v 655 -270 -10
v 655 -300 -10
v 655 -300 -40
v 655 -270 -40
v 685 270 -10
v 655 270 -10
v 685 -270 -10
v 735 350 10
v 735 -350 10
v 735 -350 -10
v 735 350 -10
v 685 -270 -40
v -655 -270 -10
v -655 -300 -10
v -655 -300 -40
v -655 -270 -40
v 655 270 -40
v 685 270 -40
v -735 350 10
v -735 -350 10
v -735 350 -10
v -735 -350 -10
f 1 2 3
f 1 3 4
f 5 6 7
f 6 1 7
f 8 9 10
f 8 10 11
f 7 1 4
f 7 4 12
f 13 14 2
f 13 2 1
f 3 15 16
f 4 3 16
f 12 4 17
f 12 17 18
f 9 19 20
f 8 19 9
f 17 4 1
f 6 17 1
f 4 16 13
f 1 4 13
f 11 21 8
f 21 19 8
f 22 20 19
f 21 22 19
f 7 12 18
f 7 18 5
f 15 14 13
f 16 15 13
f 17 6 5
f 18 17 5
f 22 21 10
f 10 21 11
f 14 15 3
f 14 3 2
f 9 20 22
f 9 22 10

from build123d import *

# Parameters (mm, degrees)
F0_W     = 1470
F0_H     = 700
F1_DEPTH = 10
F2_W     = 30
F2_H     = 30
F3_DEPTH = 270
F4_W     = 30
F4_H     = 30
F5_DEPTH = 655


with BuildPart() as f1:
    # F0 (on Top) → F1 (new body, symmetric)
    with BuildSketch(Plane.XY):
        Rectangle(F0_W, F0_H)
    extrude(amount=F1_DEPTH, both=True)


with BuildPart() as f3:
    # F2 (on Front) → F3 (new body, symmetric)
    with BuildSketch(Plane.XZ):
        with Locations((670, -25)):
            Rectangle(F2_W, F2_H)
    extrude(amount=F3_DEPTH, both=True)


with BuildPart() as f5:
    # F4 (on Right) → F5 (new body, symmetric)
    with BuildSketch(Plane.YZ):
        with Locations((-285, -25)):
            Rectangle(F4_W, F4_H)
    extrude(amount=F5_DEPTH, both=True)


solid = Compound([f1.part, f3.part, f5.part])
